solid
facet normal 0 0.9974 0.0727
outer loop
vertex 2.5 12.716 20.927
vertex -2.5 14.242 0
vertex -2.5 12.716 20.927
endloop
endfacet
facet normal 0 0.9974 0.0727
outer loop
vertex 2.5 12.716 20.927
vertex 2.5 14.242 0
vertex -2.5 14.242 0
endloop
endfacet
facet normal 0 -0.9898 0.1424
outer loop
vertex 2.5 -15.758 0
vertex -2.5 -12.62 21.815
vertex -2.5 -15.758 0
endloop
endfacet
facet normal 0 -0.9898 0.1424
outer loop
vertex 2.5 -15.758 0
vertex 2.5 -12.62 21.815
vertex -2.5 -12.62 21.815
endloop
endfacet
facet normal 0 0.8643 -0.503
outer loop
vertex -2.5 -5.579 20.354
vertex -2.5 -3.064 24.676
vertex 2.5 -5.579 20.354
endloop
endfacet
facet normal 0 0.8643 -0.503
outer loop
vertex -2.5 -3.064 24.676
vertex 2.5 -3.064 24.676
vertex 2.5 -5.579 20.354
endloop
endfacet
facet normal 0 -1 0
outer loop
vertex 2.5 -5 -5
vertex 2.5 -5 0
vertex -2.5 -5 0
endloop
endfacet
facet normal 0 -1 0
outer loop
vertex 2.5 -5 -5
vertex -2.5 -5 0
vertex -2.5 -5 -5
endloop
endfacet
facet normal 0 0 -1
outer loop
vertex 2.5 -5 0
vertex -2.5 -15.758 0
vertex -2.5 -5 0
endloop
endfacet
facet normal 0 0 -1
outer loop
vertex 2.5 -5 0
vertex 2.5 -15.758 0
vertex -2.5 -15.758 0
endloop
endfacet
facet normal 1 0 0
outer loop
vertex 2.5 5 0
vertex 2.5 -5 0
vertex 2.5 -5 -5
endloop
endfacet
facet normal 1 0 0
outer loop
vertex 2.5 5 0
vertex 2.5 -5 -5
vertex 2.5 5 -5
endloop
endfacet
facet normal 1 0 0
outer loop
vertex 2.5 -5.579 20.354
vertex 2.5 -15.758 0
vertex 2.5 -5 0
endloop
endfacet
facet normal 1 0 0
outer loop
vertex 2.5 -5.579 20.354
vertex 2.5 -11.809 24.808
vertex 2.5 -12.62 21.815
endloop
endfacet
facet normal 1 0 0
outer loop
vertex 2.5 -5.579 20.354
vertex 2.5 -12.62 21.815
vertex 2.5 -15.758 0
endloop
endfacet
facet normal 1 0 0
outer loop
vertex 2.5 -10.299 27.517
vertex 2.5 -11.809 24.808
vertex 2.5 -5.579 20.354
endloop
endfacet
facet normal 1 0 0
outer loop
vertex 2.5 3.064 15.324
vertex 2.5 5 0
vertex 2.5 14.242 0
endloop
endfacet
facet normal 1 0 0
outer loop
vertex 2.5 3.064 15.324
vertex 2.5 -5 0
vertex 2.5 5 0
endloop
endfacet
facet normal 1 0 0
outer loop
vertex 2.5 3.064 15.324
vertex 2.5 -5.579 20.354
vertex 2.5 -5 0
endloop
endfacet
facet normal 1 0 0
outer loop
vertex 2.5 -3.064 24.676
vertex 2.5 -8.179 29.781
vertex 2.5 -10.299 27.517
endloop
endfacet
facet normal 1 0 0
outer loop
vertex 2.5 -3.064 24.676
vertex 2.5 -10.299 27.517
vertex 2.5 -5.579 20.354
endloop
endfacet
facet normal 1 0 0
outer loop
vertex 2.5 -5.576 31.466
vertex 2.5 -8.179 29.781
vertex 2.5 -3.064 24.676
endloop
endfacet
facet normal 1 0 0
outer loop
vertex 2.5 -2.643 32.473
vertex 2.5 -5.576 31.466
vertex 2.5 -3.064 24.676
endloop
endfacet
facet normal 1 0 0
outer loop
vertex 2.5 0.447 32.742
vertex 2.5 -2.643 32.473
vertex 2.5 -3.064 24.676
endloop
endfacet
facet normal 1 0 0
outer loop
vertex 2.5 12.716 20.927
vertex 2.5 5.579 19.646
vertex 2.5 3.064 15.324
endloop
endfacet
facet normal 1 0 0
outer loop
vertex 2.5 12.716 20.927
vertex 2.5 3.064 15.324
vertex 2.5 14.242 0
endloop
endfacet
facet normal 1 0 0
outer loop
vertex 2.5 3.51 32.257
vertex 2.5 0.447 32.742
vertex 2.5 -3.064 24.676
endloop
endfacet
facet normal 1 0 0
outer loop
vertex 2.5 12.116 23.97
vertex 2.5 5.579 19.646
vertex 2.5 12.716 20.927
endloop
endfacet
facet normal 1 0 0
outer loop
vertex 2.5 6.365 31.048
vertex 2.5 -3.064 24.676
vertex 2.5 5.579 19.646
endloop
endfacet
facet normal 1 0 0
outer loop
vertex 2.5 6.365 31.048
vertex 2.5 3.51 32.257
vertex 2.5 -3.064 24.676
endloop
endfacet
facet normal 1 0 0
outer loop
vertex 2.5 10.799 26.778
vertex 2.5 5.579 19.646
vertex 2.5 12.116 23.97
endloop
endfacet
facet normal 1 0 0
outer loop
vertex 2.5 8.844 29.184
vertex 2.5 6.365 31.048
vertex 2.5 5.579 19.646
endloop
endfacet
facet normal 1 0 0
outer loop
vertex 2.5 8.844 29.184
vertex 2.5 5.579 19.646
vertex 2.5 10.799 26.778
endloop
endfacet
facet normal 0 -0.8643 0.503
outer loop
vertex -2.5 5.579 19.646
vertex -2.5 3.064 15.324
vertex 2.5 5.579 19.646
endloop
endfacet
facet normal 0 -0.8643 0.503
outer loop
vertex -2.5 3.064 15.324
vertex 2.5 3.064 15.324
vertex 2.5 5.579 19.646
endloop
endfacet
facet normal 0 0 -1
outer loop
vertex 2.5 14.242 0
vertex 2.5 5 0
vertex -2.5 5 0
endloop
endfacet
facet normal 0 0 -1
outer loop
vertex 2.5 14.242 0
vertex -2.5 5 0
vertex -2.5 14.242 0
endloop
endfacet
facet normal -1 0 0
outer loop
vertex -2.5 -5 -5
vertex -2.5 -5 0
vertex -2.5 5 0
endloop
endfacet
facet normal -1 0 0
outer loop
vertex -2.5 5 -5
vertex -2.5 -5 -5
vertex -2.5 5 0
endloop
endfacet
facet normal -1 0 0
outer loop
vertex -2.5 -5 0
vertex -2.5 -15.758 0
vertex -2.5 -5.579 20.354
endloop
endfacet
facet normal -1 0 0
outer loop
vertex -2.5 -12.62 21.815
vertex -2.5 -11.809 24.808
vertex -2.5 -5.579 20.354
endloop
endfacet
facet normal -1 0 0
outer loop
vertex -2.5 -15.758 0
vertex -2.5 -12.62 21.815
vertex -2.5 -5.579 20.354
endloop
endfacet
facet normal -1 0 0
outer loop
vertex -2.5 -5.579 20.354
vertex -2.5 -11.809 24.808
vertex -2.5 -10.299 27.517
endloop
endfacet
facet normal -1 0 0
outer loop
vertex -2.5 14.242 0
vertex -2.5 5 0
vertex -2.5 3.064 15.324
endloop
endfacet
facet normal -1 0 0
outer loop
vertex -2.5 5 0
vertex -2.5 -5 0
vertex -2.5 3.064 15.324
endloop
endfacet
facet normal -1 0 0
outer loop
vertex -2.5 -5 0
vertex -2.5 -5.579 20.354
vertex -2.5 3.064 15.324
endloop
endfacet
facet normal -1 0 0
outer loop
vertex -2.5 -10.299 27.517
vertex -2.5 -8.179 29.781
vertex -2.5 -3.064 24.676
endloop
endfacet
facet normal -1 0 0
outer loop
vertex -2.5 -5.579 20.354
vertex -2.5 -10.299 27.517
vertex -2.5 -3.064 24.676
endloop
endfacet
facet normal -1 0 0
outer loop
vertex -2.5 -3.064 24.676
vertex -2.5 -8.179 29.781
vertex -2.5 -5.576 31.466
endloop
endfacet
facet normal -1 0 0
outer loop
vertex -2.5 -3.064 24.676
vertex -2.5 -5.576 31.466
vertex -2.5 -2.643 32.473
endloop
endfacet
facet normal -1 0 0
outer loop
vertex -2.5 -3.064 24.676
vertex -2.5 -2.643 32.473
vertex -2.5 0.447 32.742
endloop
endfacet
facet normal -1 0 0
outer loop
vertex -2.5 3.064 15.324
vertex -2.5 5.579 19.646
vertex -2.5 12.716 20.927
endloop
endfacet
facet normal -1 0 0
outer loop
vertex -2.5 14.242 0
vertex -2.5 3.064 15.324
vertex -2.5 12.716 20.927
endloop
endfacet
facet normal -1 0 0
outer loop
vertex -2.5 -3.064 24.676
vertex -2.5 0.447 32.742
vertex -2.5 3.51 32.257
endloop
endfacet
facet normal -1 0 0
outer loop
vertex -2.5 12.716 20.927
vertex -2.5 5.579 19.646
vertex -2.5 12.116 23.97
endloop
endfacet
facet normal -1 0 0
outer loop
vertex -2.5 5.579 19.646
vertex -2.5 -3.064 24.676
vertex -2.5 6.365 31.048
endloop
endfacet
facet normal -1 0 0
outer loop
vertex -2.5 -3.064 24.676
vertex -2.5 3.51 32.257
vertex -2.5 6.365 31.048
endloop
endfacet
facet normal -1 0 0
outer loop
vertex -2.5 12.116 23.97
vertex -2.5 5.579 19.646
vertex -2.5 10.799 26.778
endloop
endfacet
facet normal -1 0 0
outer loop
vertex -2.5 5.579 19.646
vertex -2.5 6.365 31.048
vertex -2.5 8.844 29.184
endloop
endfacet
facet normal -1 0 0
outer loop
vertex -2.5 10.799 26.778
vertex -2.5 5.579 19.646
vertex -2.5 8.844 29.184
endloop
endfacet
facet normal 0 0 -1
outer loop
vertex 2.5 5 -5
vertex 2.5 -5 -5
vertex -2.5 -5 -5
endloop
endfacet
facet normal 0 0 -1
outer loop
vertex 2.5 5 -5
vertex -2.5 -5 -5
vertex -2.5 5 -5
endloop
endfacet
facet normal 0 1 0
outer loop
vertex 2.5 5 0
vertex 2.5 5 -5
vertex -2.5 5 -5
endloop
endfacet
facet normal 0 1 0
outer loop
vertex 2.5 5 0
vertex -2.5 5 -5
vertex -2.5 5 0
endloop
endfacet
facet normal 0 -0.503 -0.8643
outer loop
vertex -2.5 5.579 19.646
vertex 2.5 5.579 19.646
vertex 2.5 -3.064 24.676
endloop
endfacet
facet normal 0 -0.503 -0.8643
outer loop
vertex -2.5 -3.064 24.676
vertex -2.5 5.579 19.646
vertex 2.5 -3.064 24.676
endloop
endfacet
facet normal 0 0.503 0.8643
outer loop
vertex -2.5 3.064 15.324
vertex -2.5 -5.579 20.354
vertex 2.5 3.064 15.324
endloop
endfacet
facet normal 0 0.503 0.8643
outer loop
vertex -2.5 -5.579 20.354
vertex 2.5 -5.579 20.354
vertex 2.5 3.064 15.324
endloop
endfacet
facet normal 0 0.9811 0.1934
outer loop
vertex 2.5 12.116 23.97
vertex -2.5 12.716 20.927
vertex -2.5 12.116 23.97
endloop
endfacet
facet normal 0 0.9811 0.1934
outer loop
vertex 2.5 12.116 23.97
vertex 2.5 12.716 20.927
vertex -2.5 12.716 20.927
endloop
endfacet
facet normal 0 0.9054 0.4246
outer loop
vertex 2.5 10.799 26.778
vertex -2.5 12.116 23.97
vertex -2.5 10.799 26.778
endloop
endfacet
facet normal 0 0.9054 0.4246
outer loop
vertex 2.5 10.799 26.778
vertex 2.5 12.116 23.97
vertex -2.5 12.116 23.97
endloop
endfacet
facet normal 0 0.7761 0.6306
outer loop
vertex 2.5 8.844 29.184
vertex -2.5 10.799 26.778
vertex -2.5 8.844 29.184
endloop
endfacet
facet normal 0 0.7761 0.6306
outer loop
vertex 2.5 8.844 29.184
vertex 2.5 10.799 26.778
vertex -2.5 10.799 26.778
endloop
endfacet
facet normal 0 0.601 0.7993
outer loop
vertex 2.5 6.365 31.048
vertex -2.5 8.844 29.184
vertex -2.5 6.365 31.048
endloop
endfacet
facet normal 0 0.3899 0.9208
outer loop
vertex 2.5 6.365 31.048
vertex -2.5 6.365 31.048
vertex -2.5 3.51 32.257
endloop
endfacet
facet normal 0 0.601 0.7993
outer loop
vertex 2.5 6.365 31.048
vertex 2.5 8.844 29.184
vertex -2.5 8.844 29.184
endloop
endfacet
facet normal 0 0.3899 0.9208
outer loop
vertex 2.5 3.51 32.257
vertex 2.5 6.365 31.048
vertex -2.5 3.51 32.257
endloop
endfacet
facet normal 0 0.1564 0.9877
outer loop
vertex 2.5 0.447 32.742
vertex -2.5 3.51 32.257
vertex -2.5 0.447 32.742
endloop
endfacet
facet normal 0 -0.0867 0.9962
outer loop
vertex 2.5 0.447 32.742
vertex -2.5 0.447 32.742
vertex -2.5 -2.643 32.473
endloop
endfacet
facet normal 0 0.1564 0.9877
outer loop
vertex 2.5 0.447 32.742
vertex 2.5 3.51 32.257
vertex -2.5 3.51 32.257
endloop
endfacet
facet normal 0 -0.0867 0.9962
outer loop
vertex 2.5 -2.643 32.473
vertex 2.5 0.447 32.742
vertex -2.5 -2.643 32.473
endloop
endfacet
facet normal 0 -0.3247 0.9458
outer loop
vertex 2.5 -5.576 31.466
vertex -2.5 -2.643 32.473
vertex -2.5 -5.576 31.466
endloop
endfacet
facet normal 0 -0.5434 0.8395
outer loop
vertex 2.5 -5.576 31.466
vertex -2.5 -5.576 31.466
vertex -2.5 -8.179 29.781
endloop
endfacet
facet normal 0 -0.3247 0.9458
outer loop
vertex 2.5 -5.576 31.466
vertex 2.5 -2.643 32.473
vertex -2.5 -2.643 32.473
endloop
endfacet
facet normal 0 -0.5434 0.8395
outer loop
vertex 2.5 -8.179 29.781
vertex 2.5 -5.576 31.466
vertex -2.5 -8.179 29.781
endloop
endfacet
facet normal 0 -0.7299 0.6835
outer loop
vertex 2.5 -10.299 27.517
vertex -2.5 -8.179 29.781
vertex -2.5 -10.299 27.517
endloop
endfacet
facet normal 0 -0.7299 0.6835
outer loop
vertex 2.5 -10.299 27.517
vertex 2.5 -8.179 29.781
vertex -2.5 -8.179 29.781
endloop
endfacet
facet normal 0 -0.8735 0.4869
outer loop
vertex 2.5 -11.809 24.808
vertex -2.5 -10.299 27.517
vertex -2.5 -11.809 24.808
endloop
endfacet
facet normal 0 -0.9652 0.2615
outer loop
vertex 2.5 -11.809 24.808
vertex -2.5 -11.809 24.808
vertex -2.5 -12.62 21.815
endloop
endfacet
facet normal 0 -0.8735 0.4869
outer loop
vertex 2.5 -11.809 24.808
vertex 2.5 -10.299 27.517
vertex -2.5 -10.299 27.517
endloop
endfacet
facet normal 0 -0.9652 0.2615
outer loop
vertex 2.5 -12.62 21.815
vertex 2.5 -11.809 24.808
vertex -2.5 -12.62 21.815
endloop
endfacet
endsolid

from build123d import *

# Parameters (mm, degrees)
BOSS_EXTRUDE1_DEPTH = 2.5


with BuildPart() as part:
    # Sketch1 → Boss-Extrude1 (new, symmetric)
    with BuildSketch(Plane.YZ):
        with BuildLine():
            Line((-15.757717512, 0), (-5, 0))
            Line((-5, 0), (-5, -5))
            Line((-5, -5), (5, -5))
            Line((5, -5), (5, 0))
            Line((5, 0), (14.242282488, 0))
            Line((14.242282488, 0), (12.716235334, 20.927285791))
            ThreePointArc((12.716235334, 20.927285791), (0.446501859, 32.742179409), (-12.620138577, 21.815103933))
            Line((-12.620138577, 21.815103933), (-15.757717512, 0))
        make_face()
        Polygon((5.57894904, 19.645983596), (-3.064156301, 24.675569074), (-5.57894904, 20.354016404), (3.064156301, 15.324430926), align=None, mode=Mode.SUBTRACT)
    extrude(amount=BOSS_EXTRUDE1_DEPTH, both=True)


solid = part.part
